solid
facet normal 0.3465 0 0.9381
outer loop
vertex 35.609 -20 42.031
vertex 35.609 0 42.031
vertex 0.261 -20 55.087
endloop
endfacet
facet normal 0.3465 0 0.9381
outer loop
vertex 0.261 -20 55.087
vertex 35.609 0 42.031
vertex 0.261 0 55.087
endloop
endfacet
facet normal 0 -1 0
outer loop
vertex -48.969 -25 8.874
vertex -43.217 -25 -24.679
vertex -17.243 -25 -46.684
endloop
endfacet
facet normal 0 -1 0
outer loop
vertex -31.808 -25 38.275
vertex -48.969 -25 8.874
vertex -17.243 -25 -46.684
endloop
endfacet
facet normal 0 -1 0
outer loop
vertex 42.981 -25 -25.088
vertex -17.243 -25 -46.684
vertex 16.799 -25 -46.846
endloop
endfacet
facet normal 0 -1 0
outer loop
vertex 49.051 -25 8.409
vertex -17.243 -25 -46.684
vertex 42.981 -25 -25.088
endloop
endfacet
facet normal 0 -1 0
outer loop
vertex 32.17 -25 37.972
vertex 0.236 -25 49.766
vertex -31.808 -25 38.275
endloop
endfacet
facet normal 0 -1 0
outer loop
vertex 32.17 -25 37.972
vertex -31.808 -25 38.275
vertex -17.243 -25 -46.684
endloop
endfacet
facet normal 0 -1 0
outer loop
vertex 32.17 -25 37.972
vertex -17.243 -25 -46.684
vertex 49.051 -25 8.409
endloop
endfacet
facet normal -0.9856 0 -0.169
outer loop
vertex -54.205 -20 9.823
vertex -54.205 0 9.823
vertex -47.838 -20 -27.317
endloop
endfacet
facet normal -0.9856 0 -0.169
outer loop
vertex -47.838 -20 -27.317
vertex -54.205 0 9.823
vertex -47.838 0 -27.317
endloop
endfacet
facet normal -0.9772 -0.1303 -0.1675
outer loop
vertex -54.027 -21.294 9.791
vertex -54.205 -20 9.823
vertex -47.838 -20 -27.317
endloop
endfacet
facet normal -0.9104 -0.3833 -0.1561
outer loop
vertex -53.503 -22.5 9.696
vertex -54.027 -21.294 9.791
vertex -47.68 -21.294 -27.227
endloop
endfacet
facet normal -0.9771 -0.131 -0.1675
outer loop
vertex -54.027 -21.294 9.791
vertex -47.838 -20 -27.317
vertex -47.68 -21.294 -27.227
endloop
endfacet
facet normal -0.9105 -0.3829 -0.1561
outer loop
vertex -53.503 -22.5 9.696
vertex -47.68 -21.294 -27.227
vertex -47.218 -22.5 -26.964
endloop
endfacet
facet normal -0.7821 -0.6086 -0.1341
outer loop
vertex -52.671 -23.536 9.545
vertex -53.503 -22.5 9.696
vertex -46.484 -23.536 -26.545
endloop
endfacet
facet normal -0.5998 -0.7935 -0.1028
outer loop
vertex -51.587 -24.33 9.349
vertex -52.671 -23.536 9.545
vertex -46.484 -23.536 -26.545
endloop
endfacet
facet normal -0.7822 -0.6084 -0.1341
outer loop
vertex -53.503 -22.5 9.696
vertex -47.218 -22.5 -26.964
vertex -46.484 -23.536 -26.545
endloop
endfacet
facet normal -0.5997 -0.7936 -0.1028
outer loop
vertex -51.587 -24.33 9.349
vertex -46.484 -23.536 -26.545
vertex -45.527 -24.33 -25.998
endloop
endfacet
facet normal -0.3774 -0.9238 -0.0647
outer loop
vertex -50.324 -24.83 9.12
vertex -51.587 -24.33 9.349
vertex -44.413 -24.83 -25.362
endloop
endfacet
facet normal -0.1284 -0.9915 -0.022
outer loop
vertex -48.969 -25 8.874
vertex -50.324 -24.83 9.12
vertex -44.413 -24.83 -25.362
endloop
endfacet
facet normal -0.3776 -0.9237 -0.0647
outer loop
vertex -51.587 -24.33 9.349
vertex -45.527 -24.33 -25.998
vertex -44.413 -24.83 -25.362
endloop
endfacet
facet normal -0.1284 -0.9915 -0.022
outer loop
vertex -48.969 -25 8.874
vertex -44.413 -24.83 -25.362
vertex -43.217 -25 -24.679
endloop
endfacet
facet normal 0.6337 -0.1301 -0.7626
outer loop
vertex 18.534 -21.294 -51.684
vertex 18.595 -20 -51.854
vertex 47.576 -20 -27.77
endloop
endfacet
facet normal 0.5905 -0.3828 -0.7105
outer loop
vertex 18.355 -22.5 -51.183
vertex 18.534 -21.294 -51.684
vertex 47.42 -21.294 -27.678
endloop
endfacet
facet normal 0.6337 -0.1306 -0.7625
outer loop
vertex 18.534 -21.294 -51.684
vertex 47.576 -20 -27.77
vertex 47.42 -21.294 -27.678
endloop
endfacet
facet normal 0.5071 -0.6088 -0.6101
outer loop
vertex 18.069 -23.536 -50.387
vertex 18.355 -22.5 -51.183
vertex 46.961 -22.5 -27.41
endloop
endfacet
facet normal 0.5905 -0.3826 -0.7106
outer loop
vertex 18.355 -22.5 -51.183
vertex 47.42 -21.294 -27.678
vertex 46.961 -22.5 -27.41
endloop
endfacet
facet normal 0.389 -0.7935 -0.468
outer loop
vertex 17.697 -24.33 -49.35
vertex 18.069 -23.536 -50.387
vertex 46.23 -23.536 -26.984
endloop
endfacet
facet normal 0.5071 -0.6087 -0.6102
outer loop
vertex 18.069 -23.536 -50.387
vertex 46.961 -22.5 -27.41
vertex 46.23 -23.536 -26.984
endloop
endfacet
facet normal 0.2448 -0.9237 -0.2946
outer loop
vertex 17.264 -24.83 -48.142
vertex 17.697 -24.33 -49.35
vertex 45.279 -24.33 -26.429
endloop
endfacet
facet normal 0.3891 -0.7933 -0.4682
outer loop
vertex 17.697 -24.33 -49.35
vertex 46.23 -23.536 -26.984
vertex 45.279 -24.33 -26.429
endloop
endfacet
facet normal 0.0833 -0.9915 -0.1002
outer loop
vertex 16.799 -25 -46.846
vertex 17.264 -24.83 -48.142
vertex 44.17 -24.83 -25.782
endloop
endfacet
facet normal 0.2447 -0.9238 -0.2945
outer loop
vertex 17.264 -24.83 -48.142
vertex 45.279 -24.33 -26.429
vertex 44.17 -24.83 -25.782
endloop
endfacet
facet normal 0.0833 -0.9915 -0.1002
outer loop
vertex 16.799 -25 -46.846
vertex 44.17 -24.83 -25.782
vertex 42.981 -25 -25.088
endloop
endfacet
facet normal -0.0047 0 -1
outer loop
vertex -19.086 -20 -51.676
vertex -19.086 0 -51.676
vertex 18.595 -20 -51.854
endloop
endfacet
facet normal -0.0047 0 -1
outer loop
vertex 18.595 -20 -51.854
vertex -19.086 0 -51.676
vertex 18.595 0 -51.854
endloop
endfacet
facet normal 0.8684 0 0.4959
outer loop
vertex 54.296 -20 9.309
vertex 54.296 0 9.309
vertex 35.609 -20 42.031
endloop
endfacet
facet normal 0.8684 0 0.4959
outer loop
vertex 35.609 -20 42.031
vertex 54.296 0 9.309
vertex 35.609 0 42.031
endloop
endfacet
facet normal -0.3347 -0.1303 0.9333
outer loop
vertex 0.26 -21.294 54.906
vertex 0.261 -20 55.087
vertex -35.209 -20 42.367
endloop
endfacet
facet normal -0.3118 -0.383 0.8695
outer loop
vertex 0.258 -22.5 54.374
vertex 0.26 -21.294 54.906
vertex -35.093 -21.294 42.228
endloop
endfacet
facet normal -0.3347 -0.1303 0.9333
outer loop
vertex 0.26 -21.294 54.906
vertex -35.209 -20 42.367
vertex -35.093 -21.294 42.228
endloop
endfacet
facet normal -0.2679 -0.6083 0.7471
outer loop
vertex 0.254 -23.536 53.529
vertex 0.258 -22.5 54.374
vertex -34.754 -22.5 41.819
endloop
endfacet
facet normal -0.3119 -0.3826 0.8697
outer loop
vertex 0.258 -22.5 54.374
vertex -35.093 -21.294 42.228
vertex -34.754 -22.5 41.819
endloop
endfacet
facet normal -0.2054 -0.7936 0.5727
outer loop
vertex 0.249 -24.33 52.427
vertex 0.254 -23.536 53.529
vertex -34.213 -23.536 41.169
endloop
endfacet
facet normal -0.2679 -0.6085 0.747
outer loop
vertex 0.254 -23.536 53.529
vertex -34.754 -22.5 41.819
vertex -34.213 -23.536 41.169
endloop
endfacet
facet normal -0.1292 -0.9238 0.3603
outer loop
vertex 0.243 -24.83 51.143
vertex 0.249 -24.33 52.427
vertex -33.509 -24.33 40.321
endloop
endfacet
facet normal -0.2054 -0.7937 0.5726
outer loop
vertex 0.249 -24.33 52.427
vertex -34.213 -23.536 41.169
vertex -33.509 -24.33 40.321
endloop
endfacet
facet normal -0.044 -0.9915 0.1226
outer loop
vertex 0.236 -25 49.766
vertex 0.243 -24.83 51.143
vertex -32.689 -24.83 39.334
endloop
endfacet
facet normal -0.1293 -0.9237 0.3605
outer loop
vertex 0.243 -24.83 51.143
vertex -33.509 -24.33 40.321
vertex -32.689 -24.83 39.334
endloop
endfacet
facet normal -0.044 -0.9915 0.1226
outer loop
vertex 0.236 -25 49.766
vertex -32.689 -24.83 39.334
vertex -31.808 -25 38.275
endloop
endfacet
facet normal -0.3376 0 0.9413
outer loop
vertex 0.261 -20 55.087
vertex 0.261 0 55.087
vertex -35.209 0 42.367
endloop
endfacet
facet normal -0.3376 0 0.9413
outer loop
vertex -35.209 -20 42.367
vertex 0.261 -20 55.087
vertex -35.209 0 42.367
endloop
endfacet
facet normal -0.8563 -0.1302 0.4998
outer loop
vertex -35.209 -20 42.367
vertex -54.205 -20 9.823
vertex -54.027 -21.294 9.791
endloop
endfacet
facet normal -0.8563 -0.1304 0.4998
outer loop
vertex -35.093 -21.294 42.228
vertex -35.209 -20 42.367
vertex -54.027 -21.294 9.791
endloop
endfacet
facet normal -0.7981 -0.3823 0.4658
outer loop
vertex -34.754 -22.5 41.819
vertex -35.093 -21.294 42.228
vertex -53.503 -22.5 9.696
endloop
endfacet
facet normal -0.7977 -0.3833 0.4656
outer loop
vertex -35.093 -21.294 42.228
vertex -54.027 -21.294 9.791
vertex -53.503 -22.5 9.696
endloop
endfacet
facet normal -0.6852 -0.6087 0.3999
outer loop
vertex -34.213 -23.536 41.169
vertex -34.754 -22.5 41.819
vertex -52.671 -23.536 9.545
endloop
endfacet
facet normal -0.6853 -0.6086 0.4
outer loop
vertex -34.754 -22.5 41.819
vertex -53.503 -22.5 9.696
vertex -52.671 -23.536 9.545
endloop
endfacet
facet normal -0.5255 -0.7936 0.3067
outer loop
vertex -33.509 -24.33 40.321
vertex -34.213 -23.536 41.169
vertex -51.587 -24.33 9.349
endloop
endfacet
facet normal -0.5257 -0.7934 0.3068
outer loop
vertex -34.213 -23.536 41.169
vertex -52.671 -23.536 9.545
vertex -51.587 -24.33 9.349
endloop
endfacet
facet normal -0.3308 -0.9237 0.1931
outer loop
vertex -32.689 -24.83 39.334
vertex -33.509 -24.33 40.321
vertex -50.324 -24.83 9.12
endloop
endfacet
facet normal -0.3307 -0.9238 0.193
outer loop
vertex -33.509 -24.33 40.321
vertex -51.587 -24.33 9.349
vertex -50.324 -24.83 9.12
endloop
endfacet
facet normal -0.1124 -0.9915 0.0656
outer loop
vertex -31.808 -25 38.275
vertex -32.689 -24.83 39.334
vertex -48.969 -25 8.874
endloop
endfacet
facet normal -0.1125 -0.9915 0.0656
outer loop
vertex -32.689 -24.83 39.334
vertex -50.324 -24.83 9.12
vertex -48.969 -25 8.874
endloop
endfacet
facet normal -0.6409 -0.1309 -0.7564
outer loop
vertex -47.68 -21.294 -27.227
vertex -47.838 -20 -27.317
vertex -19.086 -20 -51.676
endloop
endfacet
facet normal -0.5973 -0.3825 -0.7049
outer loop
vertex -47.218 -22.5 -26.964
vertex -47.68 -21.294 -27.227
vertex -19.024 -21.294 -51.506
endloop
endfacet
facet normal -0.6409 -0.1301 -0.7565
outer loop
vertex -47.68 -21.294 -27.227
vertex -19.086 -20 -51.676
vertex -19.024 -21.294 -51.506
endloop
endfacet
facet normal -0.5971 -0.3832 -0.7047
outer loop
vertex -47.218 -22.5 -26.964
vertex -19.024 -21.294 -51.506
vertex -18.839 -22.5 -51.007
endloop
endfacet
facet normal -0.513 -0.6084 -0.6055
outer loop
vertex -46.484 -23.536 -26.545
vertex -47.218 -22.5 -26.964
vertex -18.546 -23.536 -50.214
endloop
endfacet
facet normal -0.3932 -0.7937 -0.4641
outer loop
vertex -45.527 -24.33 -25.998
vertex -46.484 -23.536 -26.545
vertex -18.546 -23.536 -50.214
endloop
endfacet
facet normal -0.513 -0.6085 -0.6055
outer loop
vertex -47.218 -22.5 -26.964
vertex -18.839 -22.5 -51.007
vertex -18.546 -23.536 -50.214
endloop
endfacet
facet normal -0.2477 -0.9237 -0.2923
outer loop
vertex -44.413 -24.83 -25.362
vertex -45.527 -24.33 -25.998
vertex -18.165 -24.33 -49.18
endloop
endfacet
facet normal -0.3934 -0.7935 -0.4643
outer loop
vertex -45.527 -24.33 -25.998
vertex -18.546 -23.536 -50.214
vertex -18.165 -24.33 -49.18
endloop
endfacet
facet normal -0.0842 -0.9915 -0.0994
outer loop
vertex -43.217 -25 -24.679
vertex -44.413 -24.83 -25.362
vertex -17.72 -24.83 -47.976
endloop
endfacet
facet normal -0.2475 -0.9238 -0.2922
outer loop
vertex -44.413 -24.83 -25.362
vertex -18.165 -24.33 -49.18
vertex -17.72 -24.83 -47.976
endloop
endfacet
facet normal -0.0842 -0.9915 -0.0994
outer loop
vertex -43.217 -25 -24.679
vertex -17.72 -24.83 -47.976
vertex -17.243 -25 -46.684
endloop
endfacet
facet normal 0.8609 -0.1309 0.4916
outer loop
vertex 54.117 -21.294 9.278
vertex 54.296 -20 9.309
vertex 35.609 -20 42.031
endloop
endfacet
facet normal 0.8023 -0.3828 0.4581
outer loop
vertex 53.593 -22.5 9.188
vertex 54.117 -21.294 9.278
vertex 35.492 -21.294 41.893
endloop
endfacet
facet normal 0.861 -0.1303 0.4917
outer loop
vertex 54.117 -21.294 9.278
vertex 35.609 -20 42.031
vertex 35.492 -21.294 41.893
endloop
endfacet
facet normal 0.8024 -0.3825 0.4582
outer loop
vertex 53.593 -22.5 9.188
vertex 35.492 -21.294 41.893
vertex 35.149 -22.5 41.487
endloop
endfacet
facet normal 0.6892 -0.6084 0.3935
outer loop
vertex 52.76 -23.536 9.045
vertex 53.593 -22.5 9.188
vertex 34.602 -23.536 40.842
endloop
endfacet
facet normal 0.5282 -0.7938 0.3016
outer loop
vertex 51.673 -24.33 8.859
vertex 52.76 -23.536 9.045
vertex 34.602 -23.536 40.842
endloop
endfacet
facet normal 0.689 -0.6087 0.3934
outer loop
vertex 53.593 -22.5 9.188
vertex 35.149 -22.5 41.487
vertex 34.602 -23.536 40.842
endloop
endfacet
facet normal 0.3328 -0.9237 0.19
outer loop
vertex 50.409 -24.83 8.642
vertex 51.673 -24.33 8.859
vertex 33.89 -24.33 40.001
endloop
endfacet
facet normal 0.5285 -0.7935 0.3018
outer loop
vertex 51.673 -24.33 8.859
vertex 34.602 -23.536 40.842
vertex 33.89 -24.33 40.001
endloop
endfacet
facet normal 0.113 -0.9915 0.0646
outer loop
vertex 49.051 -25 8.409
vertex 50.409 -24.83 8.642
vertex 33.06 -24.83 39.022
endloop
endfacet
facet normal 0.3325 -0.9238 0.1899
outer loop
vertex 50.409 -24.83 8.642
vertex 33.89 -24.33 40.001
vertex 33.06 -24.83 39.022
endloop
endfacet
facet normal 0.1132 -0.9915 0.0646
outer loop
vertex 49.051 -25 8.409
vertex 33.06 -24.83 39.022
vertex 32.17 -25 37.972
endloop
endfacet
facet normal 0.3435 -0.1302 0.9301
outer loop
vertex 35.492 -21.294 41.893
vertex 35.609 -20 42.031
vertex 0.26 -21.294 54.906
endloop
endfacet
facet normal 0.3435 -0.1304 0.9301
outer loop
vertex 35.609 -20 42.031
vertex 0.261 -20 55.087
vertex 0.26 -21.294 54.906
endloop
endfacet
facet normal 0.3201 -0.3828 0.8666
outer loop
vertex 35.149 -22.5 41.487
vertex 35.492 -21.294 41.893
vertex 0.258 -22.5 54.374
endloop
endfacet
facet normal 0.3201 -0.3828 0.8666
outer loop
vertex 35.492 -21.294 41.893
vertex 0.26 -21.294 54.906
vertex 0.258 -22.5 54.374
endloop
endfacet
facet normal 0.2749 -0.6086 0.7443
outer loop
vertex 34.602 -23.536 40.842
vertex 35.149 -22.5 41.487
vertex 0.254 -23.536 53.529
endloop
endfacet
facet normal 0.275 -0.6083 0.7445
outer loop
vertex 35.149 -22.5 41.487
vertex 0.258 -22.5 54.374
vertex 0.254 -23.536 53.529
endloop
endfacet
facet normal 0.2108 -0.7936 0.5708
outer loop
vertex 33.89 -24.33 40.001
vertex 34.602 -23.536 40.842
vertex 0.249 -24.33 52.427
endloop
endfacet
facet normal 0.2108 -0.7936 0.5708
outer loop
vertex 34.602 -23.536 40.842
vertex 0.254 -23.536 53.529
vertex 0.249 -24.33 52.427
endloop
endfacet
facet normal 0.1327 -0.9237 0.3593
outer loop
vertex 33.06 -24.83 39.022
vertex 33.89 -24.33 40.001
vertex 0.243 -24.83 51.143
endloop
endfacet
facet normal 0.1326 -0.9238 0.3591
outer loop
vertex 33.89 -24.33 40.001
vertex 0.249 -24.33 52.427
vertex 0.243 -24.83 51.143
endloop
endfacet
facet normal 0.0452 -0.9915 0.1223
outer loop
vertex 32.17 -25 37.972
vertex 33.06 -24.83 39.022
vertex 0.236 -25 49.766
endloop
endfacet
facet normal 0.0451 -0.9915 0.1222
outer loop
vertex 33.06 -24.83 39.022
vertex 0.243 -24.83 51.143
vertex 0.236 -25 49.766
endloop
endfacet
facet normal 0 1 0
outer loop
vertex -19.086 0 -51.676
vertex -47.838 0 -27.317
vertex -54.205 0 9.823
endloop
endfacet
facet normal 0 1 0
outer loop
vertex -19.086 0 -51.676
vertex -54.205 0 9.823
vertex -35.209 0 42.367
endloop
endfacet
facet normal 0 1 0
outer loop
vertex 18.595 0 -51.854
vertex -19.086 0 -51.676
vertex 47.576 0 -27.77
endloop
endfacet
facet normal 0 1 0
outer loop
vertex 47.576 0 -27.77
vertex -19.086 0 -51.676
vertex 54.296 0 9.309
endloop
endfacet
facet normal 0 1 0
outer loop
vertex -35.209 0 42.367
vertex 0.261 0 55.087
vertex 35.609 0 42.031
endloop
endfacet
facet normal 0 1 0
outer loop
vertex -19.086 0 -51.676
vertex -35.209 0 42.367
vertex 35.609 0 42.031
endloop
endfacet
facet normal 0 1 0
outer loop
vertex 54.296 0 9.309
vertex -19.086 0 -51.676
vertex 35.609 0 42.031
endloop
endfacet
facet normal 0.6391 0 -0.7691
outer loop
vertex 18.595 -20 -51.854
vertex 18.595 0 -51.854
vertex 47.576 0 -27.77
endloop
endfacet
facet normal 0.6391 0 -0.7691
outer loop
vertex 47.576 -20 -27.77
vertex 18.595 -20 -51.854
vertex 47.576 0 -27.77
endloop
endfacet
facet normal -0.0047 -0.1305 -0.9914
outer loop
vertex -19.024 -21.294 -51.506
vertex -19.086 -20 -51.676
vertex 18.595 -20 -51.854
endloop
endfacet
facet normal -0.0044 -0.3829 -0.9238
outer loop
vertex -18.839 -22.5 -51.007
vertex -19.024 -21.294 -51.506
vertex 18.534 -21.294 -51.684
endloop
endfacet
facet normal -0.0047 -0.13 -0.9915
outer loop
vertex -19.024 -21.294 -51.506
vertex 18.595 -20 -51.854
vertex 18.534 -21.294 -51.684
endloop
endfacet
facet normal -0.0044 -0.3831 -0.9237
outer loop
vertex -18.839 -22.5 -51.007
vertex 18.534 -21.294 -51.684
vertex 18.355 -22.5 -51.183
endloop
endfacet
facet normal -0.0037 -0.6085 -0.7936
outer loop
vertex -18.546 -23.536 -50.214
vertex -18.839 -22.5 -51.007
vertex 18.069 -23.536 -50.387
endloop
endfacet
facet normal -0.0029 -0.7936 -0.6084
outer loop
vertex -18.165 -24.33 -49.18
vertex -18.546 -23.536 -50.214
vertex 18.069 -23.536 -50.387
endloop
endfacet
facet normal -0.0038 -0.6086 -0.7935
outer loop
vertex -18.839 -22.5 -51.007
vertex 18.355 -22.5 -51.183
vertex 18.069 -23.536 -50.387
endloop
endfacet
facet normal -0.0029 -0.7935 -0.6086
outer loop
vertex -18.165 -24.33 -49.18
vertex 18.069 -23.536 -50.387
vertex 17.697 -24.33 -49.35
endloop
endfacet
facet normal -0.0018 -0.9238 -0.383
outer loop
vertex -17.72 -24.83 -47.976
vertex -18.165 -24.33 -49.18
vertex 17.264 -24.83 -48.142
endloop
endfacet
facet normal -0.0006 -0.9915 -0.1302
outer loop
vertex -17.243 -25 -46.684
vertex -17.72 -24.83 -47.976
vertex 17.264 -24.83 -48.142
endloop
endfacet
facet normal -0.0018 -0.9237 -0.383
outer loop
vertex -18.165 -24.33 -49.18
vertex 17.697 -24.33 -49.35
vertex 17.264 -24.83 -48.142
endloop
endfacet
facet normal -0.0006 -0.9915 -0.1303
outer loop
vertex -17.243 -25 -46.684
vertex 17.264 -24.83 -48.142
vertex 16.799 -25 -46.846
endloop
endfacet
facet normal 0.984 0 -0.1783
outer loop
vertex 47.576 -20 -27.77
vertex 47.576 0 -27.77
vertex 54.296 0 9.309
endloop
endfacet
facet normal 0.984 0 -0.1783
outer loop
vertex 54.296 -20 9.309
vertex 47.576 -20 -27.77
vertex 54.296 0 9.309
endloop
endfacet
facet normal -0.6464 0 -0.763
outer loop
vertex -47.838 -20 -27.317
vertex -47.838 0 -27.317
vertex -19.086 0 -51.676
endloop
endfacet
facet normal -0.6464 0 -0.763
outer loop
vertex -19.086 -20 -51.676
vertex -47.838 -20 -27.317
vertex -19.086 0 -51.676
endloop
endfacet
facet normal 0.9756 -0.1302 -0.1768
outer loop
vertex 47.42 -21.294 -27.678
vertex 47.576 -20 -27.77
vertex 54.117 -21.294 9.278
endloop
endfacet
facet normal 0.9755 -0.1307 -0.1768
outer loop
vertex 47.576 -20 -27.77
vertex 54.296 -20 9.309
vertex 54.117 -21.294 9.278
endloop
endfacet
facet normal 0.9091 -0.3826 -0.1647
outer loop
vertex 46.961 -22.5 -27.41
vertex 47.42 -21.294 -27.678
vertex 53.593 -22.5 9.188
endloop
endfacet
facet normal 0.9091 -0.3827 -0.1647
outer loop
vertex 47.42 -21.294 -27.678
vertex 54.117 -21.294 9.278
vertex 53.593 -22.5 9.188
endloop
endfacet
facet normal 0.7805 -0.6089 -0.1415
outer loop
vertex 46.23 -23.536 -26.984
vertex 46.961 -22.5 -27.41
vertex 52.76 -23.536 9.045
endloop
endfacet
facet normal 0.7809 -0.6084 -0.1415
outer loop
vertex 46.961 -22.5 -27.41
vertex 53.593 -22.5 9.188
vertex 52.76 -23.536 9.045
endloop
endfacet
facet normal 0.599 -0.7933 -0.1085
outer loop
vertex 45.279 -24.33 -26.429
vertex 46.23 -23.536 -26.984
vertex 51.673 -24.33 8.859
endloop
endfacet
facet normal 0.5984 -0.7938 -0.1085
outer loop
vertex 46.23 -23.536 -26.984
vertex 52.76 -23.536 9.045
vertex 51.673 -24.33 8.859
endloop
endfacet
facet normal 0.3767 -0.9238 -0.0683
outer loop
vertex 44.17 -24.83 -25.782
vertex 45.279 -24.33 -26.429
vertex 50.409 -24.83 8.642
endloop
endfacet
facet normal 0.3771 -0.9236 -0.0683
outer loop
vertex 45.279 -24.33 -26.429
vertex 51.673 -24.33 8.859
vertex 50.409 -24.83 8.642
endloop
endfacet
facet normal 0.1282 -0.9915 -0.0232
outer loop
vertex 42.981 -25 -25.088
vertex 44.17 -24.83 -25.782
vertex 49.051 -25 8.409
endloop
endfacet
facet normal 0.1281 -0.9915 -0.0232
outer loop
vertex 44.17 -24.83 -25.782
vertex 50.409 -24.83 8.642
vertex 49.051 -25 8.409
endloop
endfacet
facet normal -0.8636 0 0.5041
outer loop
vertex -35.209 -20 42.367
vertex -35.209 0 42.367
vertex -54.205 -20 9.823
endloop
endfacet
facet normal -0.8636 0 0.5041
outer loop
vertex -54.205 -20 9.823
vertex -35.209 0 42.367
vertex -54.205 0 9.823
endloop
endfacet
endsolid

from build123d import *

# Parameters (mm, degrees)
F1_DEPTH = 25
F2_R     = 5


with BuildPart() as f1:
    # F0 (on Front) → F1 (new body)
    with BuildSketch(Plane.XZ):
        Polygon((18.595429, -51.854381), (47.576278, -27.769849), (54.295658, 9.308504), (35.609496, 42.031304), (0.261255, 55.08719), (-35.20923, 42.367167), (-54.204925, 9.823076), (-47.837534, -27.317341), (-19.086428, -51.675671), align=None)
    extrude(amount=F1_DEPTH)

    # F2
    f2_edges = [f1.edges().sort_by_distance(p)[0] for p in [
        (33.085854, -25, -39.812115),
        (50.935968, -25, -9.230672),
        (44.952577, -25, 25.669904),
        (17.935376, -25, 48.559247),
        (-17.473987, -25, 48.727179),
        (-44.707078, -25, 26.095122),
        (-51.02123, -25, -8.747133),
        (-33.461981, -25, -39.496506),
        (-0.2455, -25, -51.765026),
    ]]
    fillet(f2_edges, radius=F2_R)


solid = f1.part
